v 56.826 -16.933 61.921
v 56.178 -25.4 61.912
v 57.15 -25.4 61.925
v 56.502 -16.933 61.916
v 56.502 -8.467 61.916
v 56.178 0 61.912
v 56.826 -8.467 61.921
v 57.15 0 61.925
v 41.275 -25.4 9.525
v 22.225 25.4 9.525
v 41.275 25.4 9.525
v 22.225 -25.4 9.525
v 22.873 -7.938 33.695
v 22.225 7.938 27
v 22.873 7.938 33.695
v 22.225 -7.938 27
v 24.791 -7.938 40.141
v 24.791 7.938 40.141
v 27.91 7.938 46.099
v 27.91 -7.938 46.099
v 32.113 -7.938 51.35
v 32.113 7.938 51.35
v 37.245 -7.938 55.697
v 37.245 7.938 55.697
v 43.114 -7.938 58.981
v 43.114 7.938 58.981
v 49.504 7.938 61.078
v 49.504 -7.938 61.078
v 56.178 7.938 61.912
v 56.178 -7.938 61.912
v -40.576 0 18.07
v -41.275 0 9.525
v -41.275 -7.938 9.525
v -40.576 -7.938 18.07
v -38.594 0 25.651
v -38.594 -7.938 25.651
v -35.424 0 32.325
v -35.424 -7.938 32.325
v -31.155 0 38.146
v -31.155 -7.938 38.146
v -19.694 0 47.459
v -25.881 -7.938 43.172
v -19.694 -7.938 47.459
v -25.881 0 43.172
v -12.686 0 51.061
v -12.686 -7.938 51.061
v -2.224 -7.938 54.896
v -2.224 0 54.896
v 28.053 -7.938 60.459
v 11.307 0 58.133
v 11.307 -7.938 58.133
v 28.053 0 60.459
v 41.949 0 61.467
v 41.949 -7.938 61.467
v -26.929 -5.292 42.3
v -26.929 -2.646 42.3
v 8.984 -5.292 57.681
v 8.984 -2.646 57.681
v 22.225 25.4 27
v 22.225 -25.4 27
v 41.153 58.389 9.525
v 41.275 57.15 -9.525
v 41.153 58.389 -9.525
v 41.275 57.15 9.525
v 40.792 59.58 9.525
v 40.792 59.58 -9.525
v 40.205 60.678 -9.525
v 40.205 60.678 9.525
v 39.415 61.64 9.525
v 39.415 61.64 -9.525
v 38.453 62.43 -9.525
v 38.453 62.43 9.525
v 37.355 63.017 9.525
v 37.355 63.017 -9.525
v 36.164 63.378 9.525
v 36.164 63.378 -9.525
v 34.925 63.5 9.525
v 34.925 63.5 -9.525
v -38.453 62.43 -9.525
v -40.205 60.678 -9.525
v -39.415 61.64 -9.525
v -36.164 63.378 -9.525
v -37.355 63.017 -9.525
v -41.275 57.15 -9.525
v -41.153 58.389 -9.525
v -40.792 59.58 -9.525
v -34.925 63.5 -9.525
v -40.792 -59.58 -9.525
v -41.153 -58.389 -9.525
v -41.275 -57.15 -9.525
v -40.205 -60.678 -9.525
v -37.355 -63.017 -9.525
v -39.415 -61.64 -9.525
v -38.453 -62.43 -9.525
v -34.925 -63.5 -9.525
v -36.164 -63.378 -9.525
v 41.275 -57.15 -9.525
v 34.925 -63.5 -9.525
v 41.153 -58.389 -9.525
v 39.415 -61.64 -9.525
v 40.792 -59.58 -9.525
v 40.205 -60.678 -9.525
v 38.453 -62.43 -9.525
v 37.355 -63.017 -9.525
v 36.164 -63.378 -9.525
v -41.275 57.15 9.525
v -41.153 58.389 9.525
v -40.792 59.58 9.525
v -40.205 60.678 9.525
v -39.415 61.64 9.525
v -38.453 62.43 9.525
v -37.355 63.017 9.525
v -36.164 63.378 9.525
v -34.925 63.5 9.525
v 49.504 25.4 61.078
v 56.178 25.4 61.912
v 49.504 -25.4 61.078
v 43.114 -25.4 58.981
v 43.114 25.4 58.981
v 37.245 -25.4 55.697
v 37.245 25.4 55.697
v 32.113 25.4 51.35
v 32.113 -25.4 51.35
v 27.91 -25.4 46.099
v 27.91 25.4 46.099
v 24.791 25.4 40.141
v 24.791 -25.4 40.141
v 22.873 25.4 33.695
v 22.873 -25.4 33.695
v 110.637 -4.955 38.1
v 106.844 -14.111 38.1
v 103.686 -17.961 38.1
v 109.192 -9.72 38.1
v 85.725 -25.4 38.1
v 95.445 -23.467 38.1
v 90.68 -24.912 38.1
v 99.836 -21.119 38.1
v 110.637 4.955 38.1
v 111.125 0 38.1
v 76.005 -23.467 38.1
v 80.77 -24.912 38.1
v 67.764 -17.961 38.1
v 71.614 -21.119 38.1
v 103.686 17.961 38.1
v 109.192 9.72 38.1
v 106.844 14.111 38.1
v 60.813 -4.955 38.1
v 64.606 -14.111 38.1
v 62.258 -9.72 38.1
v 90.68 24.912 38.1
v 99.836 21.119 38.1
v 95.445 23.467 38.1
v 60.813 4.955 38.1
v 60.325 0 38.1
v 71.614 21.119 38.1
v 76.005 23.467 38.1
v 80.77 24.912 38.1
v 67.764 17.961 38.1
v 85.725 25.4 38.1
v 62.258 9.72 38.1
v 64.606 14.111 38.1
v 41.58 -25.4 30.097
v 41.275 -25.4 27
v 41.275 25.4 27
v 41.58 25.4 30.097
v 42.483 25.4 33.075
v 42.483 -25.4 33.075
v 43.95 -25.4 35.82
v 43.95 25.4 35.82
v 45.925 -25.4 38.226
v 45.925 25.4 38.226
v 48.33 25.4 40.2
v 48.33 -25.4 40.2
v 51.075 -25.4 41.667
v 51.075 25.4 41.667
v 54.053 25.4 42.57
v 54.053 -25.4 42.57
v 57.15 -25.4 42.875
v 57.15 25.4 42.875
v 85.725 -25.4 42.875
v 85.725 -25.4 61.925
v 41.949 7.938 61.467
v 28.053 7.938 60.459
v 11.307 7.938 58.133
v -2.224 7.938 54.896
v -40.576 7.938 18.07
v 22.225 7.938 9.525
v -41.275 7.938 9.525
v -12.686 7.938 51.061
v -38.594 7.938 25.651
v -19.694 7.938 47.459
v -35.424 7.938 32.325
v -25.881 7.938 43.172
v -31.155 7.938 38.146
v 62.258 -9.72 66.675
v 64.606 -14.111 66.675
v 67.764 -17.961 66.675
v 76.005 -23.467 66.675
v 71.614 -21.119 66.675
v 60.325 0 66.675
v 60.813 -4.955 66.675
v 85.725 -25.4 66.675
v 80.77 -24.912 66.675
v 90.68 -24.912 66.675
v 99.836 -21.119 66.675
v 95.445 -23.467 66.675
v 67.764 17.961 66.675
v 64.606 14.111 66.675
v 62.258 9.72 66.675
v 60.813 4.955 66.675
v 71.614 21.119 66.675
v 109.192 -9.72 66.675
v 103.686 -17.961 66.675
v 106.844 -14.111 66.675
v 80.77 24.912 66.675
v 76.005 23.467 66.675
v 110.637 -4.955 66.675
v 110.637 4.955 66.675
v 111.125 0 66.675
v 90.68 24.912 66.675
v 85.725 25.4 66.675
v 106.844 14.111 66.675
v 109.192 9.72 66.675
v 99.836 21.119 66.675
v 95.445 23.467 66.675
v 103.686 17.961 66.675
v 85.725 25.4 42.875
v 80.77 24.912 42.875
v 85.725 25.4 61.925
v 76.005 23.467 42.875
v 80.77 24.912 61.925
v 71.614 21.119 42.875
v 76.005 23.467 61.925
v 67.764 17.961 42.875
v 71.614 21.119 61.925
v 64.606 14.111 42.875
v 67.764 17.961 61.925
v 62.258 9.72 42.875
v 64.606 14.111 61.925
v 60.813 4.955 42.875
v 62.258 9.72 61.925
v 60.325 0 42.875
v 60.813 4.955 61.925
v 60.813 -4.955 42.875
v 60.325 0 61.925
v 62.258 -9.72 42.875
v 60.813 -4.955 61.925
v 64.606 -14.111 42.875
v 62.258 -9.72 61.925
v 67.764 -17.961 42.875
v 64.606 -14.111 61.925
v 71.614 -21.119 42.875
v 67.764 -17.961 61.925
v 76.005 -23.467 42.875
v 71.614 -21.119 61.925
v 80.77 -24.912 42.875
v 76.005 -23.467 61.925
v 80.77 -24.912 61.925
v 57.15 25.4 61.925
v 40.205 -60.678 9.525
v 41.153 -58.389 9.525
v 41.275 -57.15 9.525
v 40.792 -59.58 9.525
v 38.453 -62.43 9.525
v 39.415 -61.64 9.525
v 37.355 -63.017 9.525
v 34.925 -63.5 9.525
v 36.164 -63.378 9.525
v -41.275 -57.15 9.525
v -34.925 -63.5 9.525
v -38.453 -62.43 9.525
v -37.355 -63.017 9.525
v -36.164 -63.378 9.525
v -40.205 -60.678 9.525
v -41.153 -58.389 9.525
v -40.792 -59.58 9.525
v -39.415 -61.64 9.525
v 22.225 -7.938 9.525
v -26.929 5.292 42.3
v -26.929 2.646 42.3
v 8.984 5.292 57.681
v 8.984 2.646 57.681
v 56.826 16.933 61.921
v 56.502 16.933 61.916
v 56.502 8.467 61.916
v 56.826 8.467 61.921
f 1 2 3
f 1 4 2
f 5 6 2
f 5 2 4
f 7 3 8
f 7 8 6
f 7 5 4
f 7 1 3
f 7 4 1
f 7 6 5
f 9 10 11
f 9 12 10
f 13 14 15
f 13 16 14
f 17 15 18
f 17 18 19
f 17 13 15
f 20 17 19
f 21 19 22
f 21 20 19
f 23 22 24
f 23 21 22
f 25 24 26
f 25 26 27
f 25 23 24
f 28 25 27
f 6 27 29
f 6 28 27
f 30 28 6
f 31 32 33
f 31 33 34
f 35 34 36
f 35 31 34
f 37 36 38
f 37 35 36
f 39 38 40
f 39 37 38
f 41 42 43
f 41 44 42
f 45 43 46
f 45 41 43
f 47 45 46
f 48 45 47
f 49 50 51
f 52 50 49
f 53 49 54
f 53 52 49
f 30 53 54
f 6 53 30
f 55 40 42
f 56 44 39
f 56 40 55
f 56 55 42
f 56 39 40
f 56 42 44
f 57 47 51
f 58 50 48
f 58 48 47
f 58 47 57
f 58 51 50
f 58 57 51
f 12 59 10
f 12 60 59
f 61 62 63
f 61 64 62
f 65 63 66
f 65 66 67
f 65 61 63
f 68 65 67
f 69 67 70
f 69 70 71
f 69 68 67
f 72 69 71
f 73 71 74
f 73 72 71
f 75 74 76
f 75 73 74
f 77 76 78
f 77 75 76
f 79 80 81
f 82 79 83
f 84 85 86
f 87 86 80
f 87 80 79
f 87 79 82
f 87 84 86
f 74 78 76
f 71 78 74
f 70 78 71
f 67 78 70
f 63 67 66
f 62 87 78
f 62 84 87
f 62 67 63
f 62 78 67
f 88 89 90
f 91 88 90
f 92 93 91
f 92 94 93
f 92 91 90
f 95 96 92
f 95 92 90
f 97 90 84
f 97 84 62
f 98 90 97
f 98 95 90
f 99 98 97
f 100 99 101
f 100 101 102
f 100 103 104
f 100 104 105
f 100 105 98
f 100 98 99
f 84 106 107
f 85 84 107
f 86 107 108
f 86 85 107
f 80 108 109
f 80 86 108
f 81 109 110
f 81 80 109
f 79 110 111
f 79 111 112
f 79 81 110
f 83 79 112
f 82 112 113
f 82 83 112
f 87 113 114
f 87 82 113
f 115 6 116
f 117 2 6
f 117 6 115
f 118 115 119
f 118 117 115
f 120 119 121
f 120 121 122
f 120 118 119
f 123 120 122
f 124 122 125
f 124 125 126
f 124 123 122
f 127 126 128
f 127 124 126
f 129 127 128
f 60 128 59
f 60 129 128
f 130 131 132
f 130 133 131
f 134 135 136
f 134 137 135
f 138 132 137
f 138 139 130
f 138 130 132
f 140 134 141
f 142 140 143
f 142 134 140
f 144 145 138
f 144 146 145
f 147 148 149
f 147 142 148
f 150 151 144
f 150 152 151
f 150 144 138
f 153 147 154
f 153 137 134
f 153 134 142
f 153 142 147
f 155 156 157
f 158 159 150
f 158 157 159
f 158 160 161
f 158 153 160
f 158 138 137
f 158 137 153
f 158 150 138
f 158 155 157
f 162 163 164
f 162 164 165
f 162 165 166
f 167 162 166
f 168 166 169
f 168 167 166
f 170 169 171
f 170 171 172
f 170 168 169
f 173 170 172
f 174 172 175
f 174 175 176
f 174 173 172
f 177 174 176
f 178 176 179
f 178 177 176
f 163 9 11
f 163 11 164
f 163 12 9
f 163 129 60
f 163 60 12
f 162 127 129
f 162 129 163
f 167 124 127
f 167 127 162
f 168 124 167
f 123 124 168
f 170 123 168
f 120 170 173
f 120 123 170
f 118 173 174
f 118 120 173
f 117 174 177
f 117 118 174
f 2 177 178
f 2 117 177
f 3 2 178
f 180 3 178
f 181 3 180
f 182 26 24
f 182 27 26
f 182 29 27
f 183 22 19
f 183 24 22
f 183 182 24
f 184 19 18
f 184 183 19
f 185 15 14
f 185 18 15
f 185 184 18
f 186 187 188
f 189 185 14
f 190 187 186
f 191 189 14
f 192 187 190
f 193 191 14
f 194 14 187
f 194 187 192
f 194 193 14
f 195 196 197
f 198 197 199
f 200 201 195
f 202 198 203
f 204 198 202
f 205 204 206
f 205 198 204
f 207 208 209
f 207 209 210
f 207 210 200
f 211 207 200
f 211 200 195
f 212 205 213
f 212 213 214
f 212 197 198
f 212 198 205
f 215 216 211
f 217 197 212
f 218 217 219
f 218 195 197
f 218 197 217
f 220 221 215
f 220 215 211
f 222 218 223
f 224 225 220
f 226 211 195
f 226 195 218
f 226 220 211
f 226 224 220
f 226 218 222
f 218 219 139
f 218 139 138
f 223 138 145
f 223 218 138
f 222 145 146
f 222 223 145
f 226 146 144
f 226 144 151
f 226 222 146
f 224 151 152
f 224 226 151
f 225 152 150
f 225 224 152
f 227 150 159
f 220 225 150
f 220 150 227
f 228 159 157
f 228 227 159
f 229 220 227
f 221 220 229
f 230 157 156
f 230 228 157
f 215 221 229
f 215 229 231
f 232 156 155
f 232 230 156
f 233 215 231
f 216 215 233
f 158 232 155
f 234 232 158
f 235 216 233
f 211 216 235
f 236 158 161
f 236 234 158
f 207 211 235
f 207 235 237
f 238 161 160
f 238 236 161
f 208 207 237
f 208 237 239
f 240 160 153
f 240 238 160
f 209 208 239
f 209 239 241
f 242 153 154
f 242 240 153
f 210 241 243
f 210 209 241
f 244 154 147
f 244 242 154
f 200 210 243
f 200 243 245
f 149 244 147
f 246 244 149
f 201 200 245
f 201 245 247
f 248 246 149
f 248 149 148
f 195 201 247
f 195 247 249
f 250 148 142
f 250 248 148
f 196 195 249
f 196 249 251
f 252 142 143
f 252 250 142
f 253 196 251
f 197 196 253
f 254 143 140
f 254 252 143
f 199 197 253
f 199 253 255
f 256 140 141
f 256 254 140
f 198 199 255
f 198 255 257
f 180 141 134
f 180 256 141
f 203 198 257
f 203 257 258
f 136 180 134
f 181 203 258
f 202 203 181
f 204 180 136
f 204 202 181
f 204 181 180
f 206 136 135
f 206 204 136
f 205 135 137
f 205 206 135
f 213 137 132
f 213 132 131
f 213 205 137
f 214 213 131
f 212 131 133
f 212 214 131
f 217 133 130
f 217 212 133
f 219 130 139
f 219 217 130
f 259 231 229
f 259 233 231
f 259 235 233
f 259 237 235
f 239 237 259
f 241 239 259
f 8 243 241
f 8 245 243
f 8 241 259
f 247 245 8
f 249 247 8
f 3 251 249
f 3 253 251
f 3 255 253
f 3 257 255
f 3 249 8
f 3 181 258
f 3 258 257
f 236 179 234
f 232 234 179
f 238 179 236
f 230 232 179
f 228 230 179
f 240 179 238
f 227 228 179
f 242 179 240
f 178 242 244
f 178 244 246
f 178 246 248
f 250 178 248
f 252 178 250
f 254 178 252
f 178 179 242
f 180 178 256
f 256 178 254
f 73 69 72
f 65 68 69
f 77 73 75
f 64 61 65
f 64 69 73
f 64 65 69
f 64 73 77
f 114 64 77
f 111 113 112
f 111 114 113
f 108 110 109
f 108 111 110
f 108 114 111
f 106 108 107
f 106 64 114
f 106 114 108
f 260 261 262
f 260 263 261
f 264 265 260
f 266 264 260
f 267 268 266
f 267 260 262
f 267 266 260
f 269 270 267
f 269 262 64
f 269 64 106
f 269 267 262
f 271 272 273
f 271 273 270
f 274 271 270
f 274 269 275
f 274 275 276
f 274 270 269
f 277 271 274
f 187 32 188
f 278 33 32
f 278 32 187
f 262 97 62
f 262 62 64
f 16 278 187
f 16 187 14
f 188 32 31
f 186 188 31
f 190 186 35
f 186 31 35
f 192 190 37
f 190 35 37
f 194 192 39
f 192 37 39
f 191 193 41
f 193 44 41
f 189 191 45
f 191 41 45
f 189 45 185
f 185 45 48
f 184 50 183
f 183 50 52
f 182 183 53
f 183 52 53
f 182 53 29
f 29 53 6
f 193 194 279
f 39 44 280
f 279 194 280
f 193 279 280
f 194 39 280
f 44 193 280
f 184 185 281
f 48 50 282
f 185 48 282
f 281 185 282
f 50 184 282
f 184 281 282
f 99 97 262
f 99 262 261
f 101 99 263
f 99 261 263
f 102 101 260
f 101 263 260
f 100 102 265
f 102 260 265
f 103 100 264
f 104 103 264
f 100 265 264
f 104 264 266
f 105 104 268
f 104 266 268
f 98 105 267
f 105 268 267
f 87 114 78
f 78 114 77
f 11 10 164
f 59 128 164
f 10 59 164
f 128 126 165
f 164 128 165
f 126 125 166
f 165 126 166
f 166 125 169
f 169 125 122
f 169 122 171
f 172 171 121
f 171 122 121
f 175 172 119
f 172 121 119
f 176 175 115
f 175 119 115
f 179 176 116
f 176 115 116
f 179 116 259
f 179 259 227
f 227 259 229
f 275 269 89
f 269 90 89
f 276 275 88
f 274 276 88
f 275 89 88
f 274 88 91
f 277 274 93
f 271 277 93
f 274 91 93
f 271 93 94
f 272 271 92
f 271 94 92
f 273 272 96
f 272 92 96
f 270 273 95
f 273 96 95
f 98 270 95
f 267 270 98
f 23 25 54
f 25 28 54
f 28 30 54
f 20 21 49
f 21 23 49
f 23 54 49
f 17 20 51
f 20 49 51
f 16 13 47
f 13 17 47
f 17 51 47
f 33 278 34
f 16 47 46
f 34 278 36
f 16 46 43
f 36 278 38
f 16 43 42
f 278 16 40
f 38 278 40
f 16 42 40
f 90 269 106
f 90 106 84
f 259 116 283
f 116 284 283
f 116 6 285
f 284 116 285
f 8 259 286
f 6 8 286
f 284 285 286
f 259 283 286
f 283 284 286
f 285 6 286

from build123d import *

# Parameters (mm, degrees)
F1_DEPTH = 63.5
F0_W     = 25.4
F0_H     = 19.05
F2_DEPTH = 25.4
F3_DEPTH = 7.9375
F5_R     = 6.35


with BuildPart() as f1:
    # F0 (on Front) → F1 (new body, symmetric)
    with BuildSketch(Plane.XZ):
        Polygon((-41.275, 9.525), (-41.275, -9.525), (41.275, -9.525), (41.275, 9.525), (22.225, 9.525), align=None)
    extrude(amount=F1_DEPTH, both=True)

    # F5
    f5_edges = [f1.edges().sort_by_distance(p)[0] for p in [
        (-41.275, -63.5, 0),
        (41.275, -63.5, 0),
        (41.275, 63.5, 0),
        (-41.275, 63.5, 0),
    ]]
    fillet(f5_edges, radius=F5_R)


with BuildPart() as f2:
    # F0 (on Front) → F2 (new body, symmetric)
    with BuildSketch(Plane.XZ):
        with BuildLine():
            Line((22.225, 9.525), (41.275, 9.525))
            Line((41.275, 9.525), (41.275, 27.0002))
            ThreePointArc((41.275, 27.0002), (45.9246798487, 38.2255201513), (57.15, 42.8752))
            Line((57.15, 42.8752), (60.325, 42.8752))
            Line((60.325, 42.8752), (60.325, 61.9252))
            Line((60.325, 61.9252), (57.15, 61.9252))
            add(Edge.make_bspline(
                [(56.1780302575, 61.9116723239), (56.5019603383, 61.9164954486), (56.825954601, 61.921002035), (57.15, 61.9252)],
                knots=[110.7782222377, 110.7782222377, 110.7782222377, 110.7782222377, 111.5045361635, 111.5045361635, 111.5045361635, 111.5045361635], degree=3))
            ThreePointArc((56.1780302575, 61.9116723239), (32.1130106816, 51.3498363602), (22.225, 27.0002))
            Line((22.225, 27.0002), (22.225, 9.525))
        make_face()
        with Locations((73.025, 52.4002)):
            Rectangle(F0_W, F0_H)
    extrude(amount=F2_DEPTH, both=True)

    # F0 (on Front) → F4 (revolve)
    with BuildSketch(Plane.XZ):
        Polygon((85.725, 66.675), (85.725, 61.9252), (85.725, 42.8752), (85.725, 38.1), (111.125, 38.1), (111.125, 66.675), align=None)
    revolve(axis=Axis((85.725, 0, 52.3875), (0, 0, 1)))


with BuildPart() as f3:
    # F0 (on Front) → F3 (new body, symmetric)
    with BuildSketch(Plane.XZ):
        with BuildLine():
            add(Edge.make_bspline(
                [(-41.275, 9.525), (-41.1412914304, 53.0768825952), (6.7718476056, 61.1760438853), (56.1780302575, 61.9116723239)],
                knots=[0, 0, 0, 0, 110.7782222377, 110.7782222377, 110.7782222377, 110.7782222377], degree=3))
            Line((-41.275, 9.525), (22.225, 9.525))
            Line((22.225, 9.525), (22.225, 27.0002))
            ThreePointArc((22.225, 27.0002), (32.1130106816, 51.3498363602), (56.1780302575, 61.9116723239))
        make_face()
    extrude(amount=F3_DEPTH, both=True)


solid = Compound([f1.part, f2.part, f3.part])
